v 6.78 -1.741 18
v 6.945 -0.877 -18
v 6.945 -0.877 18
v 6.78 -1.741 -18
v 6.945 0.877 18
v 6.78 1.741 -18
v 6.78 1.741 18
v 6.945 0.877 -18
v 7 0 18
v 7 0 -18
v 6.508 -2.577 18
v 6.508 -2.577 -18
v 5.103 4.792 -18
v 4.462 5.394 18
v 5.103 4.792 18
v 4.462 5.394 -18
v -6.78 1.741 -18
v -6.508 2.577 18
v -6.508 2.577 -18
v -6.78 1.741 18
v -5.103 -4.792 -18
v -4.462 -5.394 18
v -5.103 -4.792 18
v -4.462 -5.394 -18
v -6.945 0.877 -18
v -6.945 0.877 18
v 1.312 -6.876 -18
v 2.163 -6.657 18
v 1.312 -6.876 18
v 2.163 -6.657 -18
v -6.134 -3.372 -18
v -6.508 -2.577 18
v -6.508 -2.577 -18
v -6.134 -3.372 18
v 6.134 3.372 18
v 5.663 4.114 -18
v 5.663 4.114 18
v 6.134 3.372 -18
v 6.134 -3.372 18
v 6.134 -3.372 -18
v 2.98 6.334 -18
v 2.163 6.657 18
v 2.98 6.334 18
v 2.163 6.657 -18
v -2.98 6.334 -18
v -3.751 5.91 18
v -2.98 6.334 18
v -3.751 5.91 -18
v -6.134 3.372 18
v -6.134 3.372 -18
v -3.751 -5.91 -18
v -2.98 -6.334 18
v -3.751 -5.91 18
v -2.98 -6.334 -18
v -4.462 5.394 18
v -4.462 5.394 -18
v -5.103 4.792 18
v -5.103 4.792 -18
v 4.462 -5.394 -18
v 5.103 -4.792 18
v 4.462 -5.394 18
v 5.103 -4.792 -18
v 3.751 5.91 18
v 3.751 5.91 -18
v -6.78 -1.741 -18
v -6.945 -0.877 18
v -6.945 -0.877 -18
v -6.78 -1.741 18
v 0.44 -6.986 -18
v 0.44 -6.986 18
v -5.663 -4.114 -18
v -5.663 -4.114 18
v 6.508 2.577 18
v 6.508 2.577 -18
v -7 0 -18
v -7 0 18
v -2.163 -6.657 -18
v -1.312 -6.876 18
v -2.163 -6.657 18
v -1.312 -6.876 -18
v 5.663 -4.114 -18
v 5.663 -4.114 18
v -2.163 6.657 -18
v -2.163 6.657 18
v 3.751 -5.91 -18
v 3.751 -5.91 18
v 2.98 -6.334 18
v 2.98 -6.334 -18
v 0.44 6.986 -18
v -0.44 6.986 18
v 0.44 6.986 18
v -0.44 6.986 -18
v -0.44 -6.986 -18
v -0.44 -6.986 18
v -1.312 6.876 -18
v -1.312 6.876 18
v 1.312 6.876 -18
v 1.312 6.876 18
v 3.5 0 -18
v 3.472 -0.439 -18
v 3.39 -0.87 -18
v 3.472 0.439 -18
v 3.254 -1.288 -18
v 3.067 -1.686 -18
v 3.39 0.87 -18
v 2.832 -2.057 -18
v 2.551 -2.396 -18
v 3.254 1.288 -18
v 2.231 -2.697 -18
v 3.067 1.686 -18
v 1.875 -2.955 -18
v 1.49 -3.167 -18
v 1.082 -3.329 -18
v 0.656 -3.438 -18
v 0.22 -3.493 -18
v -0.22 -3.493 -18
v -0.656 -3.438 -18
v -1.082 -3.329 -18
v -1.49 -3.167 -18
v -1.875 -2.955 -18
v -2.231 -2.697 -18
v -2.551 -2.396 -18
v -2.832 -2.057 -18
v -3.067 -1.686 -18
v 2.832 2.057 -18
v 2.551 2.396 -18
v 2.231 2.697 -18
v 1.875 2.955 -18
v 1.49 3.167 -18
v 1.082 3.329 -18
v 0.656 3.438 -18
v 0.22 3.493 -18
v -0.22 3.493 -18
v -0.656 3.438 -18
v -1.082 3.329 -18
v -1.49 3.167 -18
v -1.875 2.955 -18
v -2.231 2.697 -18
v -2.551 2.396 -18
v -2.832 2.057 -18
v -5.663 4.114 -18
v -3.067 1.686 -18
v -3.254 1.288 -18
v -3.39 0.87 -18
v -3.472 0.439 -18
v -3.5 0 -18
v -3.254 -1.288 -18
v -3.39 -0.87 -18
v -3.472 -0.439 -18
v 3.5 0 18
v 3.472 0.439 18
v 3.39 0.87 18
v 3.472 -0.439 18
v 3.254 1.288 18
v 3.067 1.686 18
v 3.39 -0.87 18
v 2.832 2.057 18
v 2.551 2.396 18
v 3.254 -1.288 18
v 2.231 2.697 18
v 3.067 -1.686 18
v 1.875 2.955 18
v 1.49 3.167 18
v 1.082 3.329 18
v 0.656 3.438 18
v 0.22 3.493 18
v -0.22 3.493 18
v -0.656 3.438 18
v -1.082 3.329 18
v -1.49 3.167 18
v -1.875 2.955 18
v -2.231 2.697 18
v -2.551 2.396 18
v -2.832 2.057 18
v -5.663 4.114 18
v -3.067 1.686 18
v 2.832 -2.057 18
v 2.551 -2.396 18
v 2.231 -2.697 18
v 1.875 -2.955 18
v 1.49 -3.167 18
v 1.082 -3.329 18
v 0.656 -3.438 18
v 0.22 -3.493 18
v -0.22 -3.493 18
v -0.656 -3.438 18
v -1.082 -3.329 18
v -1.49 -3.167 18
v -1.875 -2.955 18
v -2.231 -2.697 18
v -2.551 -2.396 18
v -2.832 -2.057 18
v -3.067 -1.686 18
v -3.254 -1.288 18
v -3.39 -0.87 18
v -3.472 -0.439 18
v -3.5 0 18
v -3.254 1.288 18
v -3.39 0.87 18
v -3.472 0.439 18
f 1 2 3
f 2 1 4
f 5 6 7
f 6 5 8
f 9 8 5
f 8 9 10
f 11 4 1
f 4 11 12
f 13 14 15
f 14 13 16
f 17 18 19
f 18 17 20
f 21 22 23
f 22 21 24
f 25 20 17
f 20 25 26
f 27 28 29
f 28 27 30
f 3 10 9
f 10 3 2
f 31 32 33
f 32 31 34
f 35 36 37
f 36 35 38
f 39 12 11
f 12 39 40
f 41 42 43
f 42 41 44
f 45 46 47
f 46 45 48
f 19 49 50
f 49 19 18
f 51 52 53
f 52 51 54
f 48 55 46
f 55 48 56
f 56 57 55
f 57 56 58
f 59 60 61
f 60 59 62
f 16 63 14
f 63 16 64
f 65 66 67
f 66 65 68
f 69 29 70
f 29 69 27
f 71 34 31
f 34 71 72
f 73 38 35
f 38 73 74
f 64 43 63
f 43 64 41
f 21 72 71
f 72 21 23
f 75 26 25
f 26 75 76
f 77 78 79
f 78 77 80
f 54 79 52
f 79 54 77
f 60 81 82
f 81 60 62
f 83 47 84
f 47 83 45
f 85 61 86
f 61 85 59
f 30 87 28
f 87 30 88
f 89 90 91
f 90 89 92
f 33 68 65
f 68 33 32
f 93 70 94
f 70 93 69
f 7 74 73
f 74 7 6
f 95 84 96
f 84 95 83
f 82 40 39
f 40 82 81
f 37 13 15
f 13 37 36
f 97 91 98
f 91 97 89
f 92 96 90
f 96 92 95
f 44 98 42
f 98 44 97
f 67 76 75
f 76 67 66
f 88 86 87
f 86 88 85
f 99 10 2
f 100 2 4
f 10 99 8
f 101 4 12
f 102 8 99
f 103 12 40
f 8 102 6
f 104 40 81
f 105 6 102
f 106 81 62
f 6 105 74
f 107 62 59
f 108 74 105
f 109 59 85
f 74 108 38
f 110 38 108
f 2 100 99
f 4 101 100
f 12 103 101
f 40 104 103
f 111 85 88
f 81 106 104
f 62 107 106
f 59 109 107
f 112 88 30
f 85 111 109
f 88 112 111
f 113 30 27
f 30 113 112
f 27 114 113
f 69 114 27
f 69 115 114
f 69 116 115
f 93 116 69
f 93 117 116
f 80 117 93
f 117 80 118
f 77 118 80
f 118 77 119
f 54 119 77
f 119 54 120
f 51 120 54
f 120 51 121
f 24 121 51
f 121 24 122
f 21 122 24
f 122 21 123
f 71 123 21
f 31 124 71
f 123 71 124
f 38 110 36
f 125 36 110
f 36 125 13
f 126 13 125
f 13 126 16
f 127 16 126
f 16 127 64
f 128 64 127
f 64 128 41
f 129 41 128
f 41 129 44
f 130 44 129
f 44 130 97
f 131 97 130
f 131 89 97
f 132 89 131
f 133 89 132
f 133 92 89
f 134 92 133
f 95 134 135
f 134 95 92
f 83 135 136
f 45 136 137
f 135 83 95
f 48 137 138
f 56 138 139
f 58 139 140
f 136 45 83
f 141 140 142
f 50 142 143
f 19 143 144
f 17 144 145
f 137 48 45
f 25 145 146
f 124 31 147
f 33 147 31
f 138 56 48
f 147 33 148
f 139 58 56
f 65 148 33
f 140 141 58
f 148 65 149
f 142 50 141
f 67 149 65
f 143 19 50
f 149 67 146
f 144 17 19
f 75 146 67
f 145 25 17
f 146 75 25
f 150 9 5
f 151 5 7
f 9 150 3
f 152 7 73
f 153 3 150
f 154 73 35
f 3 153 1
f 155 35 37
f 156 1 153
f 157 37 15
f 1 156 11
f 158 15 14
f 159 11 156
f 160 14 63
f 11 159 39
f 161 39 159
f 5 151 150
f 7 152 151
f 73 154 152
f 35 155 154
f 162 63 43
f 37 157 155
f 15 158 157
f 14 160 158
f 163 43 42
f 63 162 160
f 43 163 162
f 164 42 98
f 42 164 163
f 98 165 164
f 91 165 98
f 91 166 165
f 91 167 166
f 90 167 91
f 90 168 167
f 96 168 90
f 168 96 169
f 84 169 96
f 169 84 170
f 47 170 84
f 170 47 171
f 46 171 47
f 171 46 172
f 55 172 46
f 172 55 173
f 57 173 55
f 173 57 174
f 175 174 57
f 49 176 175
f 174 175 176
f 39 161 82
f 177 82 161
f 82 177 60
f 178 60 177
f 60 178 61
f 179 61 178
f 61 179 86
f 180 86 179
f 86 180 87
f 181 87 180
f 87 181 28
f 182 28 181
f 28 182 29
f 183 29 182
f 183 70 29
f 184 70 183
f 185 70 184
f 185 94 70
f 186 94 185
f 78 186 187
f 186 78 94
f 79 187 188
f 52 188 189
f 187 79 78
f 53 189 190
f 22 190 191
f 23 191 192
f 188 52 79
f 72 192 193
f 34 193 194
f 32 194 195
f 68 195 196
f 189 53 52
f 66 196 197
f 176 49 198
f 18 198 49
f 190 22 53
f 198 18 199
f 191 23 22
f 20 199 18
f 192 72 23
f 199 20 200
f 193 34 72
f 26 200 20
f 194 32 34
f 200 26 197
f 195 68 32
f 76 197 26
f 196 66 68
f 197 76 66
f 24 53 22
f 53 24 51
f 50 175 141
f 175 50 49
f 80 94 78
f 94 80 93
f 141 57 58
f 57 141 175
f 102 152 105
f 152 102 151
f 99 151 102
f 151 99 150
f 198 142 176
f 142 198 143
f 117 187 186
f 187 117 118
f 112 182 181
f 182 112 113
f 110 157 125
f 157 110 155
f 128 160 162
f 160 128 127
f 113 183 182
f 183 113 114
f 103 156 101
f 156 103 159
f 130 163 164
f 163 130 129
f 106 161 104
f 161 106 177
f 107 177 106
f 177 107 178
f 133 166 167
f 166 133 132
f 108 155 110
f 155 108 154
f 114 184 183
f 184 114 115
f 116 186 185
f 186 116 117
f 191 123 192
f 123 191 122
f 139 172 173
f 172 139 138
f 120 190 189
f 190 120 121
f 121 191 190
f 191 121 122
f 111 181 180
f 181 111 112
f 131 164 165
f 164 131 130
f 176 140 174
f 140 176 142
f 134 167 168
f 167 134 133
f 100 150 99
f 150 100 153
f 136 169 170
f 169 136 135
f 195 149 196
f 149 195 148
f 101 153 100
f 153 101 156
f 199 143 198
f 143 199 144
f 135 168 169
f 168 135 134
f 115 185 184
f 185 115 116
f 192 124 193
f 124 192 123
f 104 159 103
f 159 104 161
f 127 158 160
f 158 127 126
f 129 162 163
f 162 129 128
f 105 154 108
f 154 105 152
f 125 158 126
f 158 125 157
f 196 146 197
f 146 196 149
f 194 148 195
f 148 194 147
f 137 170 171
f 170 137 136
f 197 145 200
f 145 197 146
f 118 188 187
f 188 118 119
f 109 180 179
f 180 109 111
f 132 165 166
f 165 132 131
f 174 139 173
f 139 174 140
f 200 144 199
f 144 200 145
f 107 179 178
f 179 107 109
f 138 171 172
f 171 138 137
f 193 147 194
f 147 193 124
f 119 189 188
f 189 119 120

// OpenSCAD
$fn = 50;


difference() {
	union() {
		translate(v = [0, 0, -18.0000000000]) {
			cylinder(h = 36, r = 7.0000000000);
		}
	}
	union() {
		translate(v = [0, 0, -100.0000000000]) {
			cylinder(h = 200, r = 3.5000000000);
		}
	}
}
